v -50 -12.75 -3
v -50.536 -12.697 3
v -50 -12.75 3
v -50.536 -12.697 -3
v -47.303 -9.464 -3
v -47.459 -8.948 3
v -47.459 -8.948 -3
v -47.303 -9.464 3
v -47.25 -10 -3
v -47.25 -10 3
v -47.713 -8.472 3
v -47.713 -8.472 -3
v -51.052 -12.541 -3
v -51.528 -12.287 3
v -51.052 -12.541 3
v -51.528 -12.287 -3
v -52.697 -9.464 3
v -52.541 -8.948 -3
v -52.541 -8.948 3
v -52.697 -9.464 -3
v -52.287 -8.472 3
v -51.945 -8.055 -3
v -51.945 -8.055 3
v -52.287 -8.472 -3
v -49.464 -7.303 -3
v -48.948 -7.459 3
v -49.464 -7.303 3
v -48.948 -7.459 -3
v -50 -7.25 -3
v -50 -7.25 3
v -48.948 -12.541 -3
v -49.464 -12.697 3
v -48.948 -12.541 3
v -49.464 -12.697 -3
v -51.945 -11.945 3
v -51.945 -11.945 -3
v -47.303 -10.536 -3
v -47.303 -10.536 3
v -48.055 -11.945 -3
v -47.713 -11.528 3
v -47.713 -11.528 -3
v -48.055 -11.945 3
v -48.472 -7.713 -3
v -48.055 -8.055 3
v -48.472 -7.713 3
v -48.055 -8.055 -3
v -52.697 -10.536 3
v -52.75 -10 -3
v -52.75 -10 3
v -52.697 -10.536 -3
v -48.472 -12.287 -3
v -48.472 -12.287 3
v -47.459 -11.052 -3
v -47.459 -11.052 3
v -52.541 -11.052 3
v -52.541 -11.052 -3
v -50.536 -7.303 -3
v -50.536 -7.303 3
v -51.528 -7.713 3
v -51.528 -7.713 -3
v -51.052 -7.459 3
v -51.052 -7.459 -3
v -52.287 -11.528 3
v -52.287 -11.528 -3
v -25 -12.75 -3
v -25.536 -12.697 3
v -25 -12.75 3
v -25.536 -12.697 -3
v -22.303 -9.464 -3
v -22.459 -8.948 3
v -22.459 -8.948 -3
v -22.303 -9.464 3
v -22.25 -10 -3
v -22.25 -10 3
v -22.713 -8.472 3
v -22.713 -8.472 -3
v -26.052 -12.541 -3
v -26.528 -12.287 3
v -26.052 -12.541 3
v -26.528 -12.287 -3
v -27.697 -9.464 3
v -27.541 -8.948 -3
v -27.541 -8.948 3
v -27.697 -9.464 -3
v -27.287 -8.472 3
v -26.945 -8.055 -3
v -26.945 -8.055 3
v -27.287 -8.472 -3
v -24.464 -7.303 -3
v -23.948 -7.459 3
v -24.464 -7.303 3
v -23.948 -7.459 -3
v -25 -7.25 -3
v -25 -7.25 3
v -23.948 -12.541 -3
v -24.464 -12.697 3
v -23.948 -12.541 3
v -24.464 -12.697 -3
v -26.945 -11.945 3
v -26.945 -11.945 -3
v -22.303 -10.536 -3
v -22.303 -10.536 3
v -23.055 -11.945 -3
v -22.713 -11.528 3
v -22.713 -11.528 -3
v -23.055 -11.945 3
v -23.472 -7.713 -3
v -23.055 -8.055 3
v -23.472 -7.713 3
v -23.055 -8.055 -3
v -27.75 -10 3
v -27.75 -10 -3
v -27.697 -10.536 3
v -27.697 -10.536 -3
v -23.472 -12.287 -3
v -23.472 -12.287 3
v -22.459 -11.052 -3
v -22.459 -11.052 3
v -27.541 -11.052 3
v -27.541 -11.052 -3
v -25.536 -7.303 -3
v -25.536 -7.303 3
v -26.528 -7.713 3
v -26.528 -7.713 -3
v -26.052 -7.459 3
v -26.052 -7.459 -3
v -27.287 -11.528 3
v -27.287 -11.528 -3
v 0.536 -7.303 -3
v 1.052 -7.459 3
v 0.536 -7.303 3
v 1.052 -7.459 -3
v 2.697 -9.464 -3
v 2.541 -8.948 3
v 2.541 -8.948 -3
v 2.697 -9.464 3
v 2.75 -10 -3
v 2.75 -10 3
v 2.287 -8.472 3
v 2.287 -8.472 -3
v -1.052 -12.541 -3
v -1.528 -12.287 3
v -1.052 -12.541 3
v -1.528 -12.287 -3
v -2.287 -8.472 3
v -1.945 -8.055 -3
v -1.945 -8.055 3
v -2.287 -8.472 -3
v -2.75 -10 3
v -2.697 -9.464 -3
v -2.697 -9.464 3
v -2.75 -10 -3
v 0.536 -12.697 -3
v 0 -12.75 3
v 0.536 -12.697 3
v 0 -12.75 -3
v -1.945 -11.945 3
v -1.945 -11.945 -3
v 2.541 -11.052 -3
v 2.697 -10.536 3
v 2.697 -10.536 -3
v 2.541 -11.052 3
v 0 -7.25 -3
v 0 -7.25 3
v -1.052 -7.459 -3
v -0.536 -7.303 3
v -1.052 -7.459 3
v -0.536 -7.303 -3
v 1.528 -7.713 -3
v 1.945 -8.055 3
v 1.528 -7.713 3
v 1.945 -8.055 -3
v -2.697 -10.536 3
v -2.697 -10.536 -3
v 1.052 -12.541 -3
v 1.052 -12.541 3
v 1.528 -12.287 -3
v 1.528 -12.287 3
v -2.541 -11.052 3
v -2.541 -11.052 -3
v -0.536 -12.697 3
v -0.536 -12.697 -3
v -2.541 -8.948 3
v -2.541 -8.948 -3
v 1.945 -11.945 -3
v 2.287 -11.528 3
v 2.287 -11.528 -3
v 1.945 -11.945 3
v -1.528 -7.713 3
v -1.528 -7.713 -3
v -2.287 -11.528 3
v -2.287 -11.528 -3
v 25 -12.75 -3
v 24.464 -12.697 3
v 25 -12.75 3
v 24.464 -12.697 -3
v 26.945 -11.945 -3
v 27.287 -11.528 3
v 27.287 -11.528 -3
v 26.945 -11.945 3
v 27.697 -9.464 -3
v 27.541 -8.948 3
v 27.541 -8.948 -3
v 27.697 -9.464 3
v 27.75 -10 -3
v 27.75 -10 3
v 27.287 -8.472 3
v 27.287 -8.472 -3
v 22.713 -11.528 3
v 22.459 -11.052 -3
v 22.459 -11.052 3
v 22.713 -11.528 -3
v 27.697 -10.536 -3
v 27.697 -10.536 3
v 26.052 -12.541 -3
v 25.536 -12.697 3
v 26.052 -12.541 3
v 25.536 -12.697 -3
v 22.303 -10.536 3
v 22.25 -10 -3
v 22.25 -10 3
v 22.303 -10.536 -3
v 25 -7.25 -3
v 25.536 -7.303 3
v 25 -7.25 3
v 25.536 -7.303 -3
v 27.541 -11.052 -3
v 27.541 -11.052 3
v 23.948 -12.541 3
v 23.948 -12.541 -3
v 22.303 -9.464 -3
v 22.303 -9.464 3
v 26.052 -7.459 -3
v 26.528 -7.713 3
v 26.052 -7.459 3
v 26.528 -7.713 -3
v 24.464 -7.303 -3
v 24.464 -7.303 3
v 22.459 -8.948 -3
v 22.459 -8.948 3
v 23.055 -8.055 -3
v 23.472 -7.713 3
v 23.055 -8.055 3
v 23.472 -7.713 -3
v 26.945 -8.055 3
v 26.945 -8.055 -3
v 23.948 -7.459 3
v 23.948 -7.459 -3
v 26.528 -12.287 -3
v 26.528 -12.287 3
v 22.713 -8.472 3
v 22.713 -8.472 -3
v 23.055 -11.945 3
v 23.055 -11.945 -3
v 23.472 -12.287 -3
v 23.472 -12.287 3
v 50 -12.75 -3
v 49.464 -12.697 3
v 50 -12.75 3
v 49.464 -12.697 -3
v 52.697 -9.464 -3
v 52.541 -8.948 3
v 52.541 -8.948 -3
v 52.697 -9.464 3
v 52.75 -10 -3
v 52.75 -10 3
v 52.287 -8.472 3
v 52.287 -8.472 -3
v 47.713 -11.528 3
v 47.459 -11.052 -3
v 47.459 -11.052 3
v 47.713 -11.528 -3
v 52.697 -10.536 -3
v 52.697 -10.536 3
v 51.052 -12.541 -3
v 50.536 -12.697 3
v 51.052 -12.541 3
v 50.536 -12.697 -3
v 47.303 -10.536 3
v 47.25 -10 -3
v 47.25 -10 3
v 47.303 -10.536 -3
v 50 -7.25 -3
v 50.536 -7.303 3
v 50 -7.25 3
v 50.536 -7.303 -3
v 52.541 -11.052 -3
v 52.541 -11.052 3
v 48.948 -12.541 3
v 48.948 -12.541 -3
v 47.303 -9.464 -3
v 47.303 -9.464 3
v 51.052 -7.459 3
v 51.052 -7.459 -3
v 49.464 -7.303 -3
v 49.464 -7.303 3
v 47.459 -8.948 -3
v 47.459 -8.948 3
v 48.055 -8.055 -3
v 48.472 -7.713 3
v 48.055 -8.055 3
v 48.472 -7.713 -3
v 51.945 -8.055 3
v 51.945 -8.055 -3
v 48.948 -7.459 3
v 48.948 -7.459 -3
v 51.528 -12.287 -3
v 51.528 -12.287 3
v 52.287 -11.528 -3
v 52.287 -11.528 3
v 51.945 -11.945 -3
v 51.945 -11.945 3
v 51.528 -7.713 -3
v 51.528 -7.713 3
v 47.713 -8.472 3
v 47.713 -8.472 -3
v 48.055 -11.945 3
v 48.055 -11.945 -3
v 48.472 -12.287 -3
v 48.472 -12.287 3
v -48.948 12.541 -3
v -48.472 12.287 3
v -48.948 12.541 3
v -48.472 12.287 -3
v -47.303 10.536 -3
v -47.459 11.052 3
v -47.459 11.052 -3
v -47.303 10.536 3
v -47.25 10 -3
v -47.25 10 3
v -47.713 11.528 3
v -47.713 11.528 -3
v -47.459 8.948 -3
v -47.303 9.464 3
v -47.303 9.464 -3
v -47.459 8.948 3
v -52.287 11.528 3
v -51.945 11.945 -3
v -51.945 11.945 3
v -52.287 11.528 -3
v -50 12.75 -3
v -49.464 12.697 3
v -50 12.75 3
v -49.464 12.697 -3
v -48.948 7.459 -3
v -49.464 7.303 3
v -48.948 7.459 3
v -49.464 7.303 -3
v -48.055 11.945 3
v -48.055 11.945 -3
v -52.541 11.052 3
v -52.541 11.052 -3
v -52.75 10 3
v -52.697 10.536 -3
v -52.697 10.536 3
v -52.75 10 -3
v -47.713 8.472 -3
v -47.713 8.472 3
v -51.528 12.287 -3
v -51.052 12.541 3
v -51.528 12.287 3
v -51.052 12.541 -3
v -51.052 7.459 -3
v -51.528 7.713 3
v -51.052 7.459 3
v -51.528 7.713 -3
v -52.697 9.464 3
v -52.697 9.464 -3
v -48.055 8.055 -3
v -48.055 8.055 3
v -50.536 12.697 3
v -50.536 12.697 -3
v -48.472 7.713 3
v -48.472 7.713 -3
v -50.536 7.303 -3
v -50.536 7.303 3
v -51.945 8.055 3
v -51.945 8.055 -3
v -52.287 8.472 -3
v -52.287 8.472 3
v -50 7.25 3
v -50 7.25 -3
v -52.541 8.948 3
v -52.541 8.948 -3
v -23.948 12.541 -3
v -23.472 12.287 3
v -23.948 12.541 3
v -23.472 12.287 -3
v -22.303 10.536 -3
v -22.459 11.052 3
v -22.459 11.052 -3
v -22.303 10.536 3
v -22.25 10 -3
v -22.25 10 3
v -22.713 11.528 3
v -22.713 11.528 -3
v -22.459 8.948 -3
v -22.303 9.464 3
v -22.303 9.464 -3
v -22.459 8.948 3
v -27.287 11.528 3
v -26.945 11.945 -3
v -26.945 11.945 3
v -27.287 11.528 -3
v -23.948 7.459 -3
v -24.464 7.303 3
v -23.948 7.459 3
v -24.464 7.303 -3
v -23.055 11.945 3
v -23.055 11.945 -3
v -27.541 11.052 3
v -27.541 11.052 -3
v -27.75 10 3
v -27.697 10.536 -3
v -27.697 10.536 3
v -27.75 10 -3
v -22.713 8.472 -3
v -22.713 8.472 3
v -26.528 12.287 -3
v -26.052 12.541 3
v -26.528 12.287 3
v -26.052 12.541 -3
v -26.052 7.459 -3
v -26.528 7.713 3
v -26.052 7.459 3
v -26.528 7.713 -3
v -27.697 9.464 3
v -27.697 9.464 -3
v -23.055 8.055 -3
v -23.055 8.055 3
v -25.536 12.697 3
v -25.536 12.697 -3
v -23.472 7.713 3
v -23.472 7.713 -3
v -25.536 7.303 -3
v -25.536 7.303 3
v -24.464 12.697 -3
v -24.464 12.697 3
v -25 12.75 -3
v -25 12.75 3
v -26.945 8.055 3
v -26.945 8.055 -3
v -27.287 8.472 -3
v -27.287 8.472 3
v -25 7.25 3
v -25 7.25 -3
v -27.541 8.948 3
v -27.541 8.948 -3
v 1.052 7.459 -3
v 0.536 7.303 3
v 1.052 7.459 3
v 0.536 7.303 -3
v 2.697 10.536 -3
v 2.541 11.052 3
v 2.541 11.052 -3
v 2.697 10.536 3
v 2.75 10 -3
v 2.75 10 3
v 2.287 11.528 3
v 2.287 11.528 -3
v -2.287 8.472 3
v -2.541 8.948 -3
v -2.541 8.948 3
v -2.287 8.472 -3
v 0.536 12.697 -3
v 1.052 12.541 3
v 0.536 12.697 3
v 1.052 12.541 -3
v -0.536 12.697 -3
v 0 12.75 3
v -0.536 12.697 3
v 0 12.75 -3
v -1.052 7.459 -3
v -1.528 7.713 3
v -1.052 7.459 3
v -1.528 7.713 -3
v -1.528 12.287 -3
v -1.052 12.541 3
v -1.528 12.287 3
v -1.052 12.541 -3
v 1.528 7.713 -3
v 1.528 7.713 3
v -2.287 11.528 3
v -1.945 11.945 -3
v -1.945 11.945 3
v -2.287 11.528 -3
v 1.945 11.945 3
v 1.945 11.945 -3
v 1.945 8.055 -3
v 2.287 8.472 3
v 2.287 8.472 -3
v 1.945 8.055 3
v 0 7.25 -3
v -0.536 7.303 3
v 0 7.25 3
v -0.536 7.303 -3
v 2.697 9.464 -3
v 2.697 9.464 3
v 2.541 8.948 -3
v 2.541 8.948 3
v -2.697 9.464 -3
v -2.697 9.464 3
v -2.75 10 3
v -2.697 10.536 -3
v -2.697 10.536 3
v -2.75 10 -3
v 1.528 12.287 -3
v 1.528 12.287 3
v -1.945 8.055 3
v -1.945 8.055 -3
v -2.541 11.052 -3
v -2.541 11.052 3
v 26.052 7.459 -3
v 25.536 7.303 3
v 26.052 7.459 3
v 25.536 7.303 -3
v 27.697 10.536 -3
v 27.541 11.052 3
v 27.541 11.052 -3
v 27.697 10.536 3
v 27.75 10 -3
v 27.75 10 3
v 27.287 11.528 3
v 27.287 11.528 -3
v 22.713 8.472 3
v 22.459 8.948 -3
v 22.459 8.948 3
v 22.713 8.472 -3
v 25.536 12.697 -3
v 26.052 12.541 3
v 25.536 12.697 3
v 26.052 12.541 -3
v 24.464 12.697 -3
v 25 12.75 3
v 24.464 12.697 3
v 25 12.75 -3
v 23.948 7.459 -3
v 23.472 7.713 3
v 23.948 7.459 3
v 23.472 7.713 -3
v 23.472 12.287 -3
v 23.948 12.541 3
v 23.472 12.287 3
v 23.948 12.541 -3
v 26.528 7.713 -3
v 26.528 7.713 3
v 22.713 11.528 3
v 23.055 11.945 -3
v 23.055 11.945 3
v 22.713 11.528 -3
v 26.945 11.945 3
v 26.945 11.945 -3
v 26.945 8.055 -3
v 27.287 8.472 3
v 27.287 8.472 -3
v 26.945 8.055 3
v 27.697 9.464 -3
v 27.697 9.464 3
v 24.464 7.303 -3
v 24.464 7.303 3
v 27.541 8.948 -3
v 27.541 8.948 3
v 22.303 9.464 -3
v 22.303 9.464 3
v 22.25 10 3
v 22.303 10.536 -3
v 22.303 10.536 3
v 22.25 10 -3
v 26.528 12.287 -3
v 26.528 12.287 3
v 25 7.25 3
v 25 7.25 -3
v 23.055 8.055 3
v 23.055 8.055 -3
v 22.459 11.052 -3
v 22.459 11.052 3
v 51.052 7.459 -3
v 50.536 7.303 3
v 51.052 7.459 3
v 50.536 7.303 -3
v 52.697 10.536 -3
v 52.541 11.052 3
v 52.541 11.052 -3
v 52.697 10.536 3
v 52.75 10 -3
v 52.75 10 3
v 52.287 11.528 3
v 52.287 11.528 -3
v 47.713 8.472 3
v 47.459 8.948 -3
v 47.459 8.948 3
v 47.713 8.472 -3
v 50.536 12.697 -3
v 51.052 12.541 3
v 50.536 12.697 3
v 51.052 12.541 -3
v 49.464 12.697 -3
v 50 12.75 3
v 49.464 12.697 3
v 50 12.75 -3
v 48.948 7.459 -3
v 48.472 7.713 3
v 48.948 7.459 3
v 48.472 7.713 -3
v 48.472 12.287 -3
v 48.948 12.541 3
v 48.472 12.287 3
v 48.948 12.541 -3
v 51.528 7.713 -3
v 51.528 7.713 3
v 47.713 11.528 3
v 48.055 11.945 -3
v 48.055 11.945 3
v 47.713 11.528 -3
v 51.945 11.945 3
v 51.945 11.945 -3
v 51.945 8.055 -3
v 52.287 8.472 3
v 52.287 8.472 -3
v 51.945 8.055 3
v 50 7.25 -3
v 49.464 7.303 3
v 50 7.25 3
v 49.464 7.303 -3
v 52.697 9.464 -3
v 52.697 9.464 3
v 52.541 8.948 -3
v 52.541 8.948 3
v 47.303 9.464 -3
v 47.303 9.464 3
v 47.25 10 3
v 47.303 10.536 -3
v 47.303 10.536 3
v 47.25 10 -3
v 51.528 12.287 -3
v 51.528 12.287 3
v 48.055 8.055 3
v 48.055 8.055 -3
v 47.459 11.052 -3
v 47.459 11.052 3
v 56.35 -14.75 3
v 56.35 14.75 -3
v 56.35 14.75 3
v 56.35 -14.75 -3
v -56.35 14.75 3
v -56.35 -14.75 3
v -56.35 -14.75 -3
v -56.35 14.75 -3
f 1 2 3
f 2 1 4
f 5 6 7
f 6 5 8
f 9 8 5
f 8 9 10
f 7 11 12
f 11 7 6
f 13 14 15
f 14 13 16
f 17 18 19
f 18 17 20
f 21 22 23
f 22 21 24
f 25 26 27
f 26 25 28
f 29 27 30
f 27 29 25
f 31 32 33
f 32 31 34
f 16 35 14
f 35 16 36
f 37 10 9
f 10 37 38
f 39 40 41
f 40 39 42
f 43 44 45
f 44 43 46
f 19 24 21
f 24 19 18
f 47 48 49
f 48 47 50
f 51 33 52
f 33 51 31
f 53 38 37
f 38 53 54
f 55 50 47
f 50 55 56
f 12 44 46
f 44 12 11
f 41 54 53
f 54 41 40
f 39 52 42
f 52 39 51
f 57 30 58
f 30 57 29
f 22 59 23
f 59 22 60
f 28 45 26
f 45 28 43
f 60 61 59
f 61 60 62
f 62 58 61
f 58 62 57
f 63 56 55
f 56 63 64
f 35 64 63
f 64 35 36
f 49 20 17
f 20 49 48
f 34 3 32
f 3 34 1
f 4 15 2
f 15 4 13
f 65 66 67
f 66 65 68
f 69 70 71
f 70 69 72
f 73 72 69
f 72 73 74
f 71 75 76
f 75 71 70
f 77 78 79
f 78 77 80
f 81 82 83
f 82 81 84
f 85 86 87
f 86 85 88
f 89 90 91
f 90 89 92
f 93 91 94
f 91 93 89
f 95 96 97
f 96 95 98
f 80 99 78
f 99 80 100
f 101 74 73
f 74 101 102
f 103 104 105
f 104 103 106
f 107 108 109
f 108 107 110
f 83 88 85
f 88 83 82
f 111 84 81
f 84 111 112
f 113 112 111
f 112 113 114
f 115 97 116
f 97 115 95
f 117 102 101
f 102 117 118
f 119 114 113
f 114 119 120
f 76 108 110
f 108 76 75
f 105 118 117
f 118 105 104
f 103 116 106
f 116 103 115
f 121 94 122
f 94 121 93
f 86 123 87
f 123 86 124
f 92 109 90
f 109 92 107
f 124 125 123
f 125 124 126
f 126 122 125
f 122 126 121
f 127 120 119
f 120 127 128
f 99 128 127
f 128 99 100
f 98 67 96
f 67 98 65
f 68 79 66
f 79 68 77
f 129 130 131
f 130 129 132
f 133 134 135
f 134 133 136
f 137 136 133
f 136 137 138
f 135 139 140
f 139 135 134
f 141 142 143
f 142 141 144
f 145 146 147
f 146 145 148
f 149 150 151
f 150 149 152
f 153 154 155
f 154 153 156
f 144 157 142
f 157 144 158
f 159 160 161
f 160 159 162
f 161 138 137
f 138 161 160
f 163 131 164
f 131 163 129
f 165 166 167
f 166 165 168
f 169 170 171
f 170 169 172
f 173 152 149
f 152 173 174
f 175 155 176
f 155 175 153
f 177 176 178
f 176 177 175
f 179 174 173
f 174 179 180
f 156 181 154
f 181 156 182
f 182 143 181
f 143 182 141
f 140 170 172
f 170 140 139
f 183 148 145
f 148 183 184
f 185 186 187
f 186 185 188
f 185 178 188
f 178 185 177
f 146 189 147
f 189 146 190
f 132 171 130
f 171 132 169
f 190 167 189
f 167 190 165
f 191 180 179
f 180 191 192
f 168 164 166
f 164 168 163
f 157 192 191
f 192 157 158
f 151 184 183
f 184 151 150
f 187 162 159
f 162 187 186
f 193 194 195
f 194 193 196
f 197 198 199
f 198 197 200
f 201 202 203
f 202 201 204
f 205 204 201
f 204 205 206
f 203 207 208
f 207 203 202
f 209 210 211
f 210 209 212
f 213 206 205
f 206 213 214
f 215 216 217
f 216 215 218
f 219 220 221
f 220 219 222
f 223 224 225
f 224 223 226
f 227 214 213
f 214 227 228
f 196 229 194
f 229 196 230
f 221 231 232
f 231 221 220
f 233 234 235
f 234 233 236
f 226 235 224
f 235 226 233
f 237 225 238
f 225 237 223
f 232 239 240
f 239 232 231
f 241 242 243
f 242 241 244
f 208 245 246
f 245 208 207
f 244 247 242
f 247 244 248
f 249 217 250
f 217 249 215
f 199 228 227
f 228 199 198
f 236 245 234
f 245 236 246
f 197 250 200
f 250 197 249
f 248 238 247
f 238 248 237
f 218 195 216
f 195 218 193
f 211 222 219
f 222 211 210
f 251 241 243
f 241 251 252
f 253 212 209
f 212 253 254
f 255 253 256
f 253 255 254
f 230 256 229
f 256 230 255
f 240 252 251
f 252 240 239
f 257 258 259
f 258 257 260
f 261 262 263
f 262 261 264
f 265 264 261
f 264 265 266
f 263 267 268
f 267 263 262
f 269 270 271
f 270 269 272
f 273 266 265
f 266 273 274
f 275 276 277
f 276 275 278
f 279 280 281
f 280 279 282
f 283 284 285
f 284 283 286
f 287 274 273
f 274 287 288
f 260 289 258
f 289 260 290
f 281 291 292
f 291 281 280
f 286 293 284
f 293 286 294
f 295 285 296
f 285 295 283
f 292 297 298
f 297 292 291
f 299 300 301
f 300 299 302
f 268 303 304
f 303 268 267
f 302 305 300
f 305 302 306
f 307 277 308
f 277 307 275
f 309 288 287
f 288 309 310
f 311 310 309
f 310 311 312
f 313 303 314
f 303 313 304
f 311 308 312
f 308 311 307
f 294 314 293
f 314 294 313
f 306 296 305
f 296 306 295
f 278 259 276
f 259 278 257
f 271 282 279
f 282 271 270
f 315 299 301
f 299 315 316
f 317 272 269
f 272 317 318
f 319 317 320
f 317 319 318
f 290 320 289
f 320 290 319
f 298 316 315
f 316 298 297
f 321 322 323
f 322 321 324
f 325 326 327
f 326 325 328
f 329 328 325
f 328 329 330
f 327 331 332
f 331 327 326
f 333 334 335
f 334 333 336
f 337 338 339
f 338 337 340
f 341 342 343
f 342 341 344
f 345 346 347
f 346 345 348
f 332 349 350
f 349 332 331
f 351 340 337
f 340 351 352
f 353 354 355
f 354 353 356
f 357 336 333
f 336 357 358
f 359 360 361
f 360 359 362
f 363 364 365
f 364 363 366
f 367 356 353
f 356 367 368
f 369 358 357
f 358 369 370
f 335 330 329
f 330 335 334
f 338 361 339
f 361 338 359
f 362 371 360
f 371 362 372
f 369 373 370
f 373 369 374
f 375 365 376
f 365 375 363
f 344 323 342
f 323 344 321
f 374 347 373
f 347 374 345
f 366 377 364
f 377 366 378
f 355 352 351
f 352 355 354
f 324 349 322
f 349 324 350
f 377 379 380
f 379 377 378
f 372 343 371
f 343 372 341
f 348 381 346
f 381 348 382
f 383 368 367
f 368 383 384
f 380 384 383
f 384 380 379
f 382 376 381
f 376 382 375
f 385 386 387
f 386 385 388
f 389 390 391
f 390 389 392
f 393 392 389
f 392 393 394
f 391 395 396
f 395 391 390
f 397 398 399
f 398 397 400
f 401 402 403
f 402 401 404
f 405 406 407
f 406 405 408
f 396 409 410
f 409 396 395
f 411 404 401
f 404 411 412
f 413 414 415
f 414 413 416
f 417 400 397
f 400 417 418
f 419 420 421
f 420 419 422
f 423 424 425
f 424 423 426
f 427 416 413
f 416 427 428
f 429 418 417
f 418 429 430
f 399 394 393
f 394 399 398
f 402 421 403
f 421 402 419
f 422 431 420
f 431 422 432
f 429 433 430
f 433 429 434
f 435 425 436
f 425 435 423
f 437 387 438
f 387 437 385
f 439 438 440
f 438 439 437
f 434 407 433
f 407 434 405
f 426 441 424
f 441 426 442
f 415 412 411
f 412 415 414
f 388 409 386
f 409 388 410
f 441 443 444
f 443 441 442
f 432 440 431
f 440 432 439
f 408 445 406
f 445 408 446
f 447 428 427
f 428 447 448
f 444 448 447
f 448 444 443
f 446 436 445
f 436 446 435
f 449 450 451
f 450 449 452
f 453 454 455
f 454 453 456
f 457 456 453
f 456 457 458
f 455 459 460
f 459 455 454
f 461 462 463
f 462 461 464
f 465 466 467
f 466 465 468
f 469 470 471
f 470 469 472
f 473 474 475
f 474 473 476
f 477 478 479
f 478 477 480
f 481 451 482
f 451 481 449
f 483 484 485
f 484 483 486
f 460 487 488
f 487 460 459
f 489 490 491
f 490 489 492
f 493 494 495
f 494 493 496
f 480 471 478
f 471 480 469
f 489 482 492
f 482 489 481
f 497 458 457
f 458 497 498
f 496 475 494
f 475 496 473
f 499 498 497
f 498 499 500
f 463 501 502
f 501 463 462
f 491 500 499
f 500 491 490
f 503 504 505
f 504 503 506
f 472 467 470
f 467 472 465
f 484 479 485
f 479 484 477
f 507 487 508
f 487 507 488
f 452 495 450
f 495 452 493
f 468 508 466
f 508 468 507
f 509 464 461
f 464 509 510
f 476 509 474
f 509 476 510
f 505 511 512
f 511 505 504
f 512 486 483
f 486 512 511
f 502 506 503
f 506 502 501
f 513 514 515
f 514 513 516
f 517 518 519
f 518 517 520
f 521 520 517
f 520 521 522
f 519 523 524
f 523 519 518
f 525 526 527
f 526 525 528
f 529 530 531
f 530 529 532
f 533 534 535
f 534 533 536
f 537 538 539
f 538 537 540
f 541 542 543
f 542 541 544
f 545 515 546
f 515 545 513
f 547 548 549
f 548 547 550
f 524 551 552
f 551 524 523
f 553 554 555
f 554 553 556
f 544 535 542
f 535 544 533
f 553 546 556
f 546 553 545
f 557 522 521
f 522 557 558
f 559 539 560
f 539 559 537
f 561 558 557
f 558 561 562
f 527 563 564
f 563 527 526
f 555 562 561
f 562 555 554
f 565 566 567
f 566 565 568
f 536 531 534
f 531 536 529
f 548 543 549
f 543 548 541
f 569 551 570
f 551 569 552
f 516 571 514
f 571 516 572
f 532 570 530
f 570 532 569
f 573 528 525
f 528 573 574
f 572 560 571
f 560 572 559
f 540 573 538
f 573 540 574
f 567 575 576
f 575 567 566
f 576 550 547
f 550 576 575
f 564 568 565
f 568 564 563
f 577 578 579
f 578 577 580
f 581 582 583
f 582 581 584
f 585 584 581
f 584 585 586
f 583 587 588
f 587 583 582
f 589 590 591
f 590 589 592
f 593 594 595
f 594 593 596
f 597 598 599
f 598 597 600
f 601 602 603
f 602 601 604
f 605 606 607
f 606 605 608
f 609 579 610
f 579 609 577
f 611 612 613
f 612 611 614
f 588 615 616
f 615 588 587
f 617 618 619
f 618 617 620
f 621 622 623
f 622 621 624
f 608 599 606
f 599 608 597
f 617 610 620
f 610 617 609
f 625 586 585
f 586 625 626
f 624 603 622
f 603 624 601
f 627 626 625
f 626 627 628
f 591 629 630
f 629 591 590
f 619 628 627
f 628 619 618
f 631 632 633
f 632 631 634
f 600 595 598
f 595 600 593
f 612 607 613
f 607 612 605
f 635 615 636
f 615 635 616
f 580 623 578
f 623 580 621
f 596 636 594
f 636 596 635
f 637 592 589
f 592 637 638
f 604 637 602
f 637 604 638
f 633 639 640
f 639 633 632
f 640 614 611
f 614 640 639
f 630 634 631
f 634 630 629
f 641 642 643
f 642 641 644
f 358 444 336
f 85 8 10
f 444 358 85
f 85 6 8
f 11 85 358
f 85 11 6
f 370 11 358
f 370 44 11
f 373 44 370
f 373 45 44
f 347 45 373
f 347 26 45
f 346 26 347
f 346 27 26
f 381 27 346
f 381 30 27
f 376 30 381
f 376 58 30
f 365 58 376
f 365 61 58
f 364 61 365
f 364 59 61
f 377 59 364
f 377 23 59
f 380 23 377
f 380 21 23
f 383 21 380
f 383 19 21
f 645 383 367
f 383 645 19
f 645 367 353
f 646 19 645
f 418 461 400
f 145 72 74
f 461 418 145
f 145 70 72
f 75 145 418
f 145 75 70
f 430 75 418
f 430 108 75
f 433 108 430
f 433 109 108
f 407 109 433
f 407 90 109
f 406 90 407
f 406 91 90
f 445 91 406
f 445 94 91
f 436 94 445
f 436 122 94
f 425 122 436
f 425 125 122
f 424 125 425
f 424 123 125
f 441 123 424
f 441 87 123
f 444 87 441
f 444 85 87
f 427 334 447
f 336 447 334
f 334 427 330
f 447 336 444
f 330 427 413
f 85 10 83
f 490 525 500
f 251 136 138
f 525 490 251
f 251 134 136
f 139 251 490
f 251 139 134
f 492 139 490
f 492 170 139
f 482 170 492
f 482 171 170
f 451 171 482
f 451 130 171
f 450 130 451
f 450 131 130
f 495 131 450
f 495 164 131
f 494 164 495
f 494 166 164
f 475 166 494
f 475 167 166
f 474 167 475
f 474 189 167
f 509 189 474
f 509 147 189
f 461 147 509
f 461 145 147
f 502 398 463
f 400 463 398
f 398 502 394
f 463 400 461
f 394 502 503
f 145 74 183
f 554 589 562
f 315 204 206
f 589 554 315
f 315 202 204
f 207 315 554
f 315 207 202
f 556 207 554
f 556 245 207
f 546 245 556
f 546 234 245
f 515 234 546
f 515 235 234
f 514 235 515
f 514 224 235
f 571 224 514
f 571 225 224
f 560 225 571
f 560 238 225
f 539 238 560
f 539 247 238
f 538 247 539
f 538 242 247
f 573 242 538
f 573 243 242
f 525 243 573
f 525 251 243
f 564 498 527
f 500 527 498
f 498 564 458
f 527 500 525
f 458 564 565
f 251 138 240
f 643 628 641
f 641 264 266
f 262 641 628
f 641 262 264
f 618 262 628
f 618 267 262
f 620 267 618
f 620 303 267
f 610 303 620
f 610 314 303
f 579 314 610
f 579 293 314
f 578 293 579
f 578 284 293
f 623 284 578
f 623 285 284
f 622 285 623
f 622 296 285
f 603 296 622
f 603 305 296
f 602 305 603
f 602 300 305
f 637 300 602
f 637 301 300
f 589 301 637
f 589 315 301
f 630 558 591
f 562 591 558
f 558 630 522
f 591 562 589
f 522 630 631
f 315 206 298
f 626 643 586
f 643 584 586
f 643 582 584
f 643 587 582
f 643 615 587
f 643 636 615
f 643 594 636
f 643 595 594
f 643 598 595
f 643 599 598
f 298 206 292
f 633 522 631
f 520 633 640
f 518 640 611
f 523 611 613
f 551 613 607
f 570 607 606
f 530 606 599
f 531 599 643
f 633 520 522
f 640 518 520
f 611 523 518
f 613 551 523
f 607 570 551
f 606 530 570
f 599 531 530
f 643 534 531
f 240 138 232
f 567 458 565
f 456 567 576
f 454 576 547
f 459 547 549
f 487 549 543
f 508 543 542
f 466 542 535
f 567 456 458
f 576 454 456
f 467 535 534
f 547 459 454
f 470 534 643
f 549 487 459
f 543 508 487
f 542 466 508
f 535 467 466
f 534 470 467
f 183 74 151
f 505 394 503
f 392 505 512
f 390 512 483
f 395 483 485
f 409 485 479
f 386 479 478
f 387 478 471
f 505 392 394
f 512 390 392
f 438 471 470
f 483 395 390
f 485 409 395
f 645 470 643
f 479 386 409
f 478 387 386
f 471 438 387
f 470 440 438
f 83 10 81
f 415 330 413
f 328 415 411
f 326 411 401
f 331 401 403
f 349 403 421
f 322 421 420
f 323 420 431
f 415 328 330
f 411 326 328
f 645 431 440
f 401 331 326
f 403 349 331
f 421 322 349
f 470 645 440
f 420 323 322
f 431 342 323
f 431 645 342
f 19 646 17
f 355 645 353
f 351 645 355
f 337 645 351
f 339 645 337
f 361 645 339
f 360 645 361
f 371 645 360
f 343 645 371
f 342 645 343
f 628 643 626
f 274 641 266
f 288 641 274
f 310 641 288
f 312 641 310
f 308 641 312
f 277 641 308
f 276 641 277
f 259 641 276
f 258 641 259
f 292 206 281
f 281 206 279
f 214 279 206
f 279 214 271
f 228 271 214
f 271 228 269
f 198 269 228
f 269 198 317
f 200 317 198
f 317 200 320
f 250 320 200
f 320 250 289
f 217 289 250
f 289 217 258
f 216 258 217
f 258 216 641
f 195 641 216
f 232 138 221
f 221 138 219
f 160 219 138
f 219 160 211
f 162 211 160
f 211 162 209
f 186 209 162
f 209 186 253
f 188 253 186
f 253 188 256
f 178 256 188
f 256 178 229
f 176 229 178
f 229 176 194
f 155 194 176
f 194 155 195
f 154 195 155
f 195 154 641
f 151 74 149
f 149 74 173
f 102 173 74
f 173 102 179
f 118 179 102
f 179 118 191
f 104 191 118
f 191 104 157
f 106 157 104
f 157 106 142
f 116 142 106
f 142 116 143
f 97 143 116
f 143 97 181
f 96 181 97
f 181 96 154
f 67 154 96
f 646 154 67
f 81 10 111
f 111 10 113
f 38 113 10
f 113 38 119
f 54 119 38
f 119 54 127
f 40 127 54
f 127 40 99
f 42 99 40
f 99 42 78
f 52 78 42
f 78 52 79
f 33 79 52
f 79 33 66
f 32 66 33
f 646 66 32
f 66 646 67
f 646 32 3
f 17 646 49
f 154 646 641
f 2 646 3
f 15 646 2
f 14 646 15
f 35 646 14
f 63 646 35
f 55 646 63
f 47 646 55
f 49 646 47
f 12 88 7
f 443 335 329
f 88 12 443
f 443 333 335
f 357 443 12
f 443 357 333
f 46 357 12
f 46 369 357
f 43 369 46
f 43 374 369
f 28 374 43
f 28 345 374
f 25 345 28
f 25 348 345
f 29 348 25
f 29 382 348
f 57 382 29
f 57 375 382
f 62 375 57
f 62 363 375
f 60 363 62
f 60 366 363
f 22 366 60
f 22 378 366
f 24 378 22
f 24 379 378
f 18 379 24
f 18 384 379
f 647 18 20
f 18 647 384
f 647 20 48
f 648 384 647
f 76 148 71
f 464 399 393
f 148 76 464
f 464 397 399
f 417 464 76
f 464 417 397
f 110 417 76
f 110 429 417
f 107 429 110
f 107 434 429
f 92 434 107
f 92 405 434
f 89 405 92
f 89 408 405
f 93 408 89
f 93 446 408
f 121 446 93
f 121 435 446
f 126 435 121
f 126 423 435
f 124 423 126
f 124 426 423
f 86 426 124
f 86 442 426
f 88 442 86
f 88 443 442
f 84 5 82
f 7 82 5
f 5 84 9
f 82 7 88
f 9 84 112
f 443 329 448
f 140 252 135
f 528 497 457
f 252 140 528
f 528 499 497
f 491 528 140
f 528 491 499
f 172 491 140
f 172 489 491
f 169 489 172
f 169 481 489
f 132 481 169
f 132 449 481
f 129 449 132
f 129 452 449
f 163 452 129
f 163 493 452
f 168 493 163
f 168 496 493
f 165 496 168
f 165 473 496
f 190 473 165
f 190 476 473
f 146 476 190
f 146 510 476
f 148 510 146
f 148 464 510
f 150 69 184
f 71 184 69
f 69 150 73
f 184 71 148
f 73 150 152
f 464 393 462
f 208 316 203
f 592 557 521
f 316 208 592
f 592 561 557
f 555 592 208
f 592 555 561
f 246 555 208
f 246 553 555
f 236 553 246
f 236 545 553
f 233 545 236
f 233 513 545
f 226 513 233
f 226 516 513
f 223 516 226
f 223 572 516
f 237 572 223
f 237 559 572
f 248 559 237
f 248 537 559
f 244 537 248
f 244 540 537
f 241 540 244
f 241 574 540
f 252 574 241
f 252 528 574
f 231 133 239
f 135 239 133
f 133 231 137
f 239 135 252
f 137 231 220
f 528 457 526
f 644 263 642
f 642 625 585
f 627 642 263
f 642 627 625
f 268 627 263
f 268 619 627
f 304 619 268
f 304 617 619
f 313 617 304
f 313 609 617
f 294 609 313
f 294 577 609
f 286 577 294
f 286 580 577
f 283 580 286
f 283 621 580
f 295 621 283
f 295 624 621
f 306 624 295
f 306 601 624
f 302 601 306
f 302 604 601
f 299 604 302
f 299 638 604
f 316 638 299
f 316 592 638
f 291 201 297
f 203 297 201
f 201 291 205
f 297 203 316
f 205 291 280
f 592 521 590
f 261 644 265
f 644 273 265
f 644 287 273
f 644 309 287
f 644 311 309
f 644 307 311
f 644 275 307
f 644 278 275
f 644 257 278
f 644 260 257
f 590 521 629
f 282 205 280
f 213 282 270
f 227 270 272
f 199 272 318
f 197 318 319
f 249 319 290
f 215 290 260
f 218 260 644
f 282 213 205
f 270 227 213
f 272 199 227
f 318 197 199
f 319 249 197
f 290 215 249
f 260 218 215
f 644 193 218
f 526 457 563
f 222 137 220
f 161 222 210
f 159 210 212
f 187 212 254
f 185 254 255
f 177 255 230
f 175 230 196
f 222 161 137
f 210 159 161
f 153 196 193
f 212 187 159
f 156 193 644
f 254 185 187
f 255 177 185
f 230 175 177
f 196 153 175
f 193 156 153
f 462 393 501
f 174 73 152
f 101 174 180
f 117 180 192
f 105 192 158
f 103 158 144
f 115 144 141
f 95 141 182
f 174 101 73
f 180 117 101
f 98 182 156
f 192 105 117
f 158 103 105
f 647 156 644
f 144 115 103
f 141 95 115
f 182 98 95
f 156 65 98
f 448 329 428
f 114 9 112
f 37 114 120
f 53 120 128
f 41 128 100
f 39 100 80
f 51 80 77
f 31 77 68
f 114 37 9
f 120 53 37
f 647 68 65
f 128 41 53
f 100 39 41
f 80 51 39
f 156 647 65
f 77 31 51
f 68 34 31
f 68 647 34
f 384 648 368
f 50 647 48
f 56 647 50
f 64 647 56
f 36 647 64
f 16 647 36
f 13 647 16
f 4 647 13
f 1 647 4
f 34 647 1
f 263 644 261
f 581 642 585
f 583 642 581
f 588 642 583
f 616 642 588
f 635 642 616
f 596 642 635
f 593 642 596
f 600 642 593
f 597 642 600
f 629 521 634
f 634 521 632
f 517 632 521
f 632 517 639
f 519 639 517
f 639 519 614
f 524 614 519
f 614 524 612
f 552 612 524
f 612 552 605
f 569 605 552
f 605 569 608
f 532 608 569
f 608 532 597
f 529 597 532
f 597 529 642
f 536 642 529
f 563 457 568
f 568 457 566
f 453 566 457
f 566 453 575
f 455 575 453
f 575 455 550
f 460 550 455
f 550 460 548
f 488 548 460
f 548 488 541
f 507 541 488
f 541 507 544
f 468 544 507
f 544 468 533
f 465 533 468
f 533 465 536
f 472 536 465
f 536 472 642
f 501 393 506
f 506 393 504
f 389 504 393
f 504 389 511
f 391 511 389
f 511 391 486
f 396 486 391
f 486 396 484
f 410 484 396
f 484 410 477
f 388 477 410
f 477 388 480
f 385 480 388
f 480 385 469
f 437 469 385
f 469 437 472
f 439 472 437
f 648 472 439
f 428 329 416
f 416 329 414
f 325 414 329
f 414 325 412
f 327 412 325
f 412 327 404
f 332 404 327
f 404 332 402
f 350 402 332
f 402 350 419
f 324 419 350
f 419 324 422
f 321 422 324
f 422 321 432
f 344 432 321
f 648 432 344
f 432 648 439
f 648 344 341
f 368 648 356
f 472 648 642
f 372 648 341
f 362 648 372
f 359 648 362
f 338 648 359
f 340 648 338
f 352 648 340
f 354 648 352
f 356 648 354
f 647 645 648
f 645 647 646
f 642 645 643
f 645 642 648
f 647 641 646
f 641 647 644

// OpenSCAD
$fn = 32;

// ----------------------------------------------------------------------
// Hole bar, 5 x Ø5.5
// tworows layout, 6.35 mm edge offset
// ----------------------------------------------------------------------

// --- parameters (mm) ---
bar_w = 29.5;     // bar width (Y)
bar_t = 6;        // bar thickness (Z)
holes = 5;        // holes per row
hole_d = 5.5;     // hole diameter
edge = 6.35;      // offset from the bar end to the first hole
pitch = 25;       // pitch between neighbouring holes
row_offset = 20;  // distance between the two rows

// --- derived feature positions (mm) ---
span = (holes - 1) * pitch;   // = 100   distance between the end holes
bar_l = span + 2 * edge;      // = 112.7   overall bar length
start_x = -bar_l / 2 + edge;  // = -50   X of the first hole
feature_centers = [
  [start_x + 0 * pitch, -row_offset / 2],
  [start_x + 1 * pitch, -row_offset / 2],
  [start_x + 2 * pitch, -row_offset / 2],
  [start_x + 3 * pitch, -row_offset / 2],
  [start_x + 4 * pitch, -row_offset / 2]
];   // hole centres of the first row
row2_centers = [
  [start_x + 0 * pitch, row_offset / 2],
  [start_x + 1 * pitch, row_offset / 2],
  [start_x + 2 * pitch, row_offset / 2],
  [start_x + 3 * pitch, row_offset / 2],
  [start_x + 4 * pitch, row_offset / 2]
];   // hole centres of the second row

// bar with two rows of holes, both read from their own centre arrays
difference() {
  translate([-bar_l / 2, -bar_w / 2, -bar_t / 2]) cube([bar_l, bar_w, bar_t]);
  for (centre = feature_centers)
    translate([centre[0], centre[1], 0])
      cylinder(d = hole_d, h = bar_t + 2, center = true);
  for (centre = row2_centers)
    translate([centre[0], centre[1], 0])
      cylinder(d = hole_d, h = bar_t + 2, center = true);
}
